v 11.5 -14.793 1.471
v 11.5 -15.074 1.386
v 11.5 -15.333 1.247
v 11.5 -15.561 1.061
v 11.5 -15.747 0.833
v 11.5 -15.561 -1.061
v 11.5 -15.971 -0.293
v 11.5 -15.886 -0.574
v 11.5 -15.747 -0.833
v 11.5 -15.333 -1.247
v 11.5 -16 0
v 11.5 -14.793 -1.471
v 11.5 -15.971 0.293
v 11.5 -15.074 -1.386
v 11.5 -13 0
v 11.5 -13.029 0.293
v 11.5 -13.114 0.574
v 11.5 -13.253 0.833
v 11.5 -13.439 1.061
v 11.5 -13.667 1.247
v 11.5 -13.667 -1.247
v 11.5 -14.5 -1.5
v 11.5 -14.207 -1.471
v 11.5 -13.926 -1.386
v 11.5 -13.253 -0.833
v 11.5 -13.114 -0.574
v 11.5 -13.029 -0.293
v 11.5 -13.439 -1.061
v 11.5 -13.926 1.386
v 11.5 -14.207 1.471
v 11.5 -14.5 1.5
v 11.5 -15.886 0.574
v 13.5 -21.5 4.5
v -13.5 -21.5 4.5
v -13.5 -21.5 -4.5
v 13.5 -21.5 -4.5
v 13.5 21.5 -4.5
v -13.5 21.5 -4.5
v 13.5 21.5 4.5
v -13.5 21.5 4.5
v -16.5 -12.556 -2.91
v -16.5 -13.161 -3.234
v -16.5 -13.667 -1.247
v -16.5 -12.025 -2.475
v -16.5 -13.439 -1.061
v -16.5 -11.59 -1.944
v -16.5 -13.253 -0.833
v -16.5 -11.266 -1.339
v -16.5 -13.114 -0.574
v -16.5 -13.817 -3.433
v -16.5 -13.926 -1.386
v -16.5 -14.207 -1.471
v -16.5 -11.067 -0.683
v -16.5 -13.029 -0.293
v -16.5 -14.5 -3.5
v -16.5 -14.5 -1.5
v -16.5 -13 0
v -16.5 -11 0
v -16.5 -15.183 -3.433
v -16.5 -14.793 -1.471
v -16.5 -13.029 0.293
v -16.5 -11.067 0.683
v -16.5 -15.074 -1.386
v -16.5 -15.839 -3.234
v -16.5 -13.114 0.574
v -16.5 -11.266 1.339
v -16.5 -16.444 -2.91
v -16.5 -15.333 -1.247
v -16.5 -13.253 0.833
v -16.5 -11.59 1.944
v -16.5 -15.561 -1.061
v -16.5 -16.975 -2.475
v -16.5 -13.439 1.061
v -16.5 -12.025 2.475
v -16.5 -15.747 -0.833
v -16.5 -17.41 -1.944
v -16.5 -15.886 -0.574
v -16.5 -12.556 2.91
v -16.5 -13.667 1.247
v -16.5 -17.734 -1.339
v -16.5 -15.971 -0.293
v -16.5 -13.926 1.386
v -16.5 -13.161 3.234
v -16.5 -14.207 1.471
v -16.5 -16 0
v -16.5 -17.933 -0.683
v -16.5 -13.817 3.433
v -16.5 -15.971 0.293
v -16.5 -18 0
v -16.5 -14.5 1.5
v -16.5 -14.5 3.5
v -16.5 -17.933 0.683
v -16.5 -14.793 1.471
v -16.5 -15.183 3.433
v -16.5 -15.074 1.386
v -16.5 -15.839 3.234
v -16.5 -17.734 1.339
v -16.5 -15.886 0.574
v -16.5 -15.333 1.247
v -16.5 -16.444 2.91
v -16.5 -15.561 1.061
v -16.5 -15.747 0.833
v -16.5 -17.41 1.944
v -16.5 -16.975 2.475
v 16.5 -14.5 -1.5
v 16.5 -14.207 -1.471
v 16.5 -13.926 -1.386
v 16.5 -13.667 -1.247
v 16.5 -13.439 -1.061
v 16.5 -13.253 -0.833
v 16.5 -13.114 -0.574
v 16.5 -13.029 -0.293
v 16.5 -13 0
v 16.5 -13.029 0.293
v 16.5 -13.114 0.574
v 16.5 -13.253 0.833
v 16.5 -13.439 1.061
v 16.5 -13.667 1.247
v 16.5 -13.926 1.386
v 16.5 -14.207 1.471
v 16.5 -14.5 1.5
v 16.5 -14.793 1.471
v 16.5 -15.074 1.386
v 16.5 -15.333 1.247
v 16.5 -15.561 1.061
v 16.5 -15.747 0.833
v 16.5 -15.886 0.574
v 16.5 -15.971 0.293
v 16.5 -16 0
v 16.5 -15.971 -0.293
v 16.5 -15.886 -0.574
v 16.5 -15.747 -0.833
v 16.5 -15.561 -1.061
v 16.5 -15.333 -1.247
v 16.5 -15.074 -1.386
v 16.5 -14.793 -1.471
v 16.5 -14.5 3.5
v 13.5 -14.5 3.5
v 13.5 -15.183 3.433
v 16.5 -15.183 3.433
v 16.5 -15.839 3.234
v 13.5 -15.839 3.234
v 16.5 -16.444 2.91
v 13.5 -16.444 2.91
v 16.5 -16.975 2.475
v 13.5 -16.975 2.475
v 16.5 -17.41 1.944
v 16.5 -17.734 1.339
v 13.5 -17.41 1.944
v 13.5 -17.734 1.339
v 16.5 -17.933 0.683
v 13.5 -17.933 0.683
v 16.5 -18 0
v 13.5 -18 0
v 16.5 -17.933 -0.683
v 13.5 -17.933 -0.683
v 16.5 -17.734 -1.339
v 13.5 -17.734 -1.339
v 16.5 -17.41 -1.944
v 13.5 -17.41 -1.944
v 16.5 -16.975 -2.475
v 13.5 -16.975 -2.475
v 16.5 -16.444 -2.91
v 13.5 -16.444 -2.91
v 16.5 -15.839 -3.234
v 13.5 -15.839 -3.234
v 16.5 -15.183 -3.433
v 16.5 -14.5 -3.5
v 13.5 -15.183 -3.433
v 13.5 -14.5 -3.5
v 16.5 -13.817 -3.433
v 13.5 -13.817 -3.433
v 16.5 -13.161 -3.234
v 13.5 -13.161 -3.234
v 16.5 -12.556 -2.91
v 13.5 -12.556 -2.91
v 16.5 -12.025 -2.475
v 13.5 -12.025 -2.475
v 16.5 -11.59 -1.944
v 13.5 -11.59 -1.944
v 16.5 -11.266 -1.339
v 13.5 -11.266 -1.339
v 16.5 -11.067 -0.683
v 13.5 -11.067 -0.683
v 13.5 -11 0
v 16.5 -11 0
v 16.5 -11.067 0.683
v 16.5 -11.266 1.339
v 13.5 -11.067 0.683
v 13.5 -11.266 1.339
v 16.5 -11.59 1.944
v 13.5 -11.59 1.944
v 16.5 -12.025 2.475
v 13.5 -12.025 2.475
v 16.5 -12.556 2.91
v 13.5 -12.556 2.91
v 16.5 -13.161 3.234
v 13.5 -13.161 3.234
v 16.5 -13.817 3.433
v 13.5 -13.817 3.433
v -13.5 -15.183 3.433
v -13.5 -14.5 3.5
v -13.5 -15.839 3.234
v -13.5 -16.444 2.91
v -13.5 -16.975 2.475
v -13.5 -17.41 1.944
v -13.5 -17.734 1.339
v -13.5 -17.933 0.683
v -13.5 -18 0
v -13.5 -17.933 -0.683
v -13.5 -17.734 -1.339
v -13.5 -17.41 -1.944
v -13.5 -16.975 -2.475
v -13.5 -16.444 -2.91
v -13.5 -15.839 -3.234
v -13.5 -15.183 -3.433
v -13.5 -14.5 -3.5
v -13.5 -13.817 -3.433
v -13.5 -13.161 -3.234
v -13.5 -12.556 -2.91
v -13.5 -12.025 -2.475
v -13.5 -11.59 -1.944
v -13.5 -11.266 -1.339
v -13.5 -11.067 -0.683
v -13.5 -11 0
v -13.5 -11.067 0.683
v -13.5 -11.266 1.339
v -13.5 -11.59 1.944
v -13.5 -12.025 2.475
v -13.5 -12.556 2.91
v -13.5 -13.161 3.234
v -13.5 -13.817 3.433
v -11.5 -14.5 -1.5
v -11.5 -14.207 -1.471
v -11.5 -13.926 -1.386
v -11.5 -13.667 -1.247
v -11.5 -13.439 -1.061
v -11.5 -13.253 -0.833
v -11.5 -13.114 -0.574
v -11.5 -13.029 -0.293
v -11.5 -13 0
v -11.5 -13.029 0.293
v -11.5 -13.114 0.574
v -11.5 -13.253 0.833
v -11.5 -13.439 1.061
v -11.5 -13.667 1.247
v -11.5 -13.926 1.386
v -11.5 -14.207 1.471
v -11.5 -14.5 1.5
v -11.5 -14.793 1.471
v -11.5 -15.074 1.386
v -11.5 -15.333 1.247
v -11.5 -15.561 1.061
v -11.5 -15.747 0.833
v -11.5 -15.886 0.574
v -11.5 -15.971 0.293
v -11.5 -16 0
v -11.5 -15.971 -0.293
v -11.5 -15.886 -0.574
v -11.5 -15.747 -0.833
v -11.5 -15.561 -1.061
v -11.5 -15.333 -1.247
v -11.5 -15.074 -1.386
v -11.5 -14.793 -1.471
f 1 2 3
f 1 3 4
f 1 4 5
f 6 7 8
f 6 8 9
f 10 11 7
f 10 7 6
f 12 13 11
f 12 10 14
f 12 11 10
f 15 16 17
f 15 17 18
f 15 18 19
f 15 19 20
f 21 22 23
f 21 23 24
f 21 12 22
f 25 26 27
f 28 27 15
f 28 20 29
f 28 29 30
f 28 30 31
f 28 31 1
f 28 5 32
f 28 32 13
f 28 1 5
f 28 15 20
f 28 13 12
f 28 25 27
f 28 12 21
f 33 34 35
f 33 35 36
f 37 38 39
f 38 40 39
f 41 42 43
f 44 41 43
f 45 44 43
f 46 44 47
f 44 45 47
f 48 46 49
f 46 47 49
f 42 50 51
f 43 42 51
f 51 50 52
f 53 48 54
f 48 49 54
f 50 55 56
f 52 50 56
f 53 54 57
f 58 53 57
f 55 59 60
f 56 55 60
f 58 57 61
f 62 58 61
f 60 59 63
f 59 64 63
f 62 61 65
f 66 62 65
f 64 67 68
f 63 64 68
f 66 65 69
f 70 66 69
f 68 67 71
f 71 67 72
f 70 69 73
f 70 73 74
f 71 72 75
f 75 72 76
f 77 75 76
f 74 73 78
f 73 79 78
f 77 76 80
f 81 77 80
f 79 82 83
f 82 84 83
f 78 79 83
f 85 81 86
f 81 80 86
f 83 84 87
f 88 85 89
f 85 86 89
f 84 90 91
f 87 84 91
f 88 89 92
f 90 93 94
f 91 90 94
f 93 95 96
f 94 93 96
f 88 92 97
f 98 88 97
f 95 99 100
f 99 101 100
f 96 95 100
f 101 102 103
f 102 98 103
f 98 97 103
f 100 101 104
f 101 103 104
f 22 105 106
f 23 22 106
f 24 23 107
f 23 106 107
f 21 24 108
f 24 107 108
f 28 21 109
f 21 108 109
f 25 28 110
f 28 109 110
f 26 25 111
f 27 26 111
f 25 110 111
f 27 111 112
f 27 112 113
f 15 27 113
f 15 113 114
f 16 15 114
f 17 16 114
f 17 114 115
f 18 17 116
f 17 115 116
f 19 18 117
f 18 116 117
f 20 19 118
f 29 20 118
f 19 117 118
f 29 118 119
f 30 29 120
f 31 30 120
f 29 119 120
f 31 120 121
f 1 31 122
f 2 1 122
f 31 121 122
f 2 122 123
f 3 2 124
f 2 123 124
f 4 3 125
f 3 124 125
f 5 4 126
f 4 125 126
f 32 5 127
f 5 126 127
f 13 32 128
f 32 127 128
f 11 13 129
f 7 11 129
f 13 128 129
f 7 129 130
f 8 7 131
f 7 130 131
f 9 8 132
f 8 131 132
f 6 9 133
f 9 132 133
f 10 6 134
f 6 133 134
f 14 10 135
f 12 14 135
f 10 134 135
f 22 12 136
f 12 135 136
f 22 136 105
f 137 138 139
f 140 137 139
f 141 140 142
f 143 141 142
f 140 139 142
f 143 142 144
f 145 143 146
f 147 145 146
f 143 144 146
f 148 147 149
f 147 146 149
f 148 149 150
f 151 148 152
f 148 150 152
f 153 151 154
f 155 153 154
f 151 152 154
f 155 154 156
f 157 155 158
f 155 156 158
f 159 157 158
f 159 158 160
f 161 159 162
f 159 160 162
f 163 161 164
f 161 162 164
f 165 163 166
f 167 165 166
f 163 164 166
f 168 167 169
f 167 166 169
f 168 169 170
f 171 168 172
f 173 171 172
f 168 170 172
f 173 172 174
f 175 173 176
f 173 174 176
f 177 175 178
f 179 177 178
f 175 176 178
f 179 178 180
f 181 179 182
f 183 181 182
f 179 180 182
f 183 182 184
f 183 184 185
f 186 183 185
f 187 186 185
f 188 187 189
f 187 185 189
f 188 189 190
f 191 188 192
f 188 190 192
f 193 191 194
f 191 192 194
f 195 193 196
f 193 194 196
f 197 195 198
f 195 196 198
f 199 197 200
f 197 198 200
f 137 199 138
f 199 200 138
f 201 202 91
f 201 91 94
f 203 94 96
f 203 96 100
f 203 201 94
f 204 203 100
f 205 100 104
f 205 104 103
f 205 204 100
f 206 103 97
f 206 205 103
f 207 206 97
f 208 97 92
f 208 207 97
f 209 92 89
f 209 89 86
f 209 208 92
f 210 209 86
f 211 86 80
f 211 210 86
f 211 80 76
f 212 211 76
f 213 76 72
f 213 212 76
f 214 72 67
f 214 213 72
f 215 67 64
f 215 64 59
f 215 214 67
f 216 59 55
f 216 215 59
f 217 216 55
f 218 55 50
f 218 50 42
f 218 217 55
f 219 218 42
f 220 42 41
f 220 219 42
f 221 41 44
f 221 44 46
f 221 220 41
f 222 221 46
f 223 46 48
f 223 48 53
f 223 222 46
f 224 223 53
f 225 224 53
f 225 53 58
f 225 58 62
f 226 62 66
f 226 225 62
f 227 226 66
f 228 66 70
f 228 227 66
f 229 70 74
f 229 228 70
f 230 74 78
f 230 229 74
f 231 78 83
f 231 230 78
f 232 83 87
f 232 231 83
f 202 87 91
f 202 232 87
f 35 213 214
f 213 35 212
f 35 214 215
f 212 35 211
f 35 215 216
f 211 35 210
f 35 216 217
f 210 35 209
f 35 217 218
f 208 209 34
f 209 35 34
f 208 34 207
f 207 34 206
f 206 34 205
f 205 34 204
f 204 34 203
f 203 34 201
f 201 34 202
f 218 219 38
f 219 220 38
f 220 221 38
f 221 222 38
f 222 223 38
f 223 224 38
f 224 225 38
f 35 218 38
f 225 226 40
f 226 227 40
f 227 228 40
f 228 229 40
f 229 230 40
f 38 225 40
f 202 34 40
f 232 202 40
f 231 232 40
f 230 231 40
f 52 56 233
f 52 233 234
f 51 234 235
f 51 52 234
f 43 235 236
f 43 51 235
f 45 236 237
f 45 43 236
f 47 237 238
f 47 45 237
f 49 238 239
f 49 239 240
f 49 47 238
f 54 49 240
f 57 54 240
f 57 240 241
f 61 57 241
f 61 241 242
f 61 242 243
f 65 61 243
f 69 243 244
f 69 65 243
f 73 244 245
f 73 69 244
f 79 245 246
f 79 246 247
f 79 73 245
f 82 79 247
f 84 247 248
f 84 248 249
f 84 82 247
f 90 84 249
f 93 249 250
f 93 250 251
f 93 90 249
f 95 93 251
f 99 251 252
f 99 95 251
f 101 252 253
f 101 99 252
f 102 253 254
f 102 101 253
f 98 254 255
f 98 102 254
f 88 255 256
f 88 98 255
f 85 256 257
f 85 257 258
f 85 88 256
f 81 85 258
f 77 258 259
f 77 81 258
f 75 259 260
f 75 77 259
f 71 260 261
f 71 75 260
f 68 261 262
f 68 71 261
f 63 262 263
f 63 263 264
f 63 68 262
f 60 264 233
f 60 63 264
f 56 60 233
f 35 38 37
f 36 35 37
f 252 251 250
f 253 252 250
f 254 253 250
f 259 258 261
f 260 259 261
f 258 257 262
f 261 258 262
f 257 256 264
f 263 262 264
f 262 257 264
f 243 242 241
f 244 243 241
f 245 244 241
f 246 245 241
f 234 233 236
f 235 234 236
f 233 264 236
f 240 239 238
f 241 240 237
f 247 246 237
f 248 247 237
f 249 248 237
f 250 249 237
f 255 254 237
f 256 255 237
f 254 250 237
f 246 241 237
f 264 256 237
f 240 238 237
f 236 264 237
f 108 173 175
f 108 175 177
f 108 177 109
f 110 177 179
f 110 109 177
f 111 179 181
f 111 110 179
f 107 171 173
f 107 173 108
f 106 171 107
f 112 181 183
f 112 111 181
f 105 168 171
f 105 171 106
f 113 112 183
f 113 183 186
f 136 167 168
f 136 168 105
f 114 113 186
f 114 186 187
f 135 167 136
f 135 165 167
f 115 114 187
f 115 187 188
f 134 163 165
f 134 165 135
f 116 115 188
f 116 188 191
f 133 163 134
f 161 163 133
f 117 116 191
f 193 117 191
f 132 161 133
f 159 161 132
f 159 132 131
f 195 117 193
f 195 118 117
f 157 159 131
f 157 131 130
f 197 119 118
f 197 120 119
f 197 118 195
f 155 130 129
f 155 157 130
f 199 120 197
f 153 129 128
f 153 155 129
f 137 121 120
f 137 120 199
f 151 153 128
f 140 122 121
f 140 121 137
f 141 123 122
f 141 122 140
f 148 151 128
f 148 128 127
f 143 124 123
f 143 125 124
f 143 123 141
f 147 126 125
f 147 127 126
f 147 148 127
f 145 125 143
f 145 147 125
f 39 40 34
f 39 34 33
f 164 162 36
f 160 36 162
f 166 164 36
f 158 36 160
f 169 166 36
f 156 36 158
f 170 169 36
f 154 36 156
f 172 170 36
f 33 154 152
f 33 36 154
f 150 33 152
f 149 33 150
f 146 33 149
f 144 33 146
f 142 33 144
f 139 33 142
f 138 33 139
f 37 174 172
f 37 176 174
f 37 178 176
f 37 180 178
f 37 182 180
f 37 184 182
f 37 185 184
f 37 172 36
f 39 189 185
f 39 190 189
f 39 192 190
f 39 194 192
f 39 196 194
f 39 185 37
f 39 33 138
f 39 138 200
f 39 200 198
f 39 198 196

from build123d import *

# Parameters (mm, degrees)
CROQUIS1_W              = 27
CROQUIS1_H              = 43
SALIENTE_EXTRUIR1_DEPTH = 4.5
CROQUIS2_R              = 3.5
SALIENTE_EXTRUIR2_DEPTH = 3
CROQUIS3_R              = 1.5
CORTAR_EXTRUIR1_DEPTH   = 5


with BuildPart() as part:
    # Croquis1 → Saliente-Extruir1 (new, symmetric)
    with BuildSketch(Plane.XY):
        Rectangle(CROQUIS1_W, CROQUIS1_H)
    extrude(amount=SALIENTE_EXTRUIR1_DEPTH, both=True)

    # Croquis2 → Saliente-Extruir2 (add)
    with BuildSketch(Plane(origin=(13.5, 0, 0), x_dir=(0, 0, -1), z_dir=(1, 0, 0))):
        with Locations(Location((0, -14.5, 0), (0, 0, 180))):
            Circle(CROQUIS2_R)
    saliente_extruir2 = extrude(amount=SALIENTE_EXTRUIR2_DEPTH)

    # Croquis3 → Cortar-Extruir1 (cut)
    with BuildSketch(Plane(origin=(16.5, 0, 0), x_dir=(0, 0, -1), z_dir=(1, 0, 0))):
        with Locations((0, -14.5)):
            Circle(CROQUIS3_R)
    cortar_extruir1 = extrude(amount=-CORTAR_EXTRUIR1_DEPTH, mode=Mode.SUBTRACT)

    # Simetría2: Saliente-Extruir2, Cortar-Extruir1 across plane
    add(saliente_extruir2.mirror(Plane(origin=(0, 0, 0), x_dir=(0, 0, 1), z_dir=(1, 0, 0))))
    add(cortar_extruir1.mirror(Plane(origin=(0, 0, 0), x_dir=(0, 0, 1), z_dir=(1, 0, 0))), mode=Mode.SUBTRACT)


solid = part.part
